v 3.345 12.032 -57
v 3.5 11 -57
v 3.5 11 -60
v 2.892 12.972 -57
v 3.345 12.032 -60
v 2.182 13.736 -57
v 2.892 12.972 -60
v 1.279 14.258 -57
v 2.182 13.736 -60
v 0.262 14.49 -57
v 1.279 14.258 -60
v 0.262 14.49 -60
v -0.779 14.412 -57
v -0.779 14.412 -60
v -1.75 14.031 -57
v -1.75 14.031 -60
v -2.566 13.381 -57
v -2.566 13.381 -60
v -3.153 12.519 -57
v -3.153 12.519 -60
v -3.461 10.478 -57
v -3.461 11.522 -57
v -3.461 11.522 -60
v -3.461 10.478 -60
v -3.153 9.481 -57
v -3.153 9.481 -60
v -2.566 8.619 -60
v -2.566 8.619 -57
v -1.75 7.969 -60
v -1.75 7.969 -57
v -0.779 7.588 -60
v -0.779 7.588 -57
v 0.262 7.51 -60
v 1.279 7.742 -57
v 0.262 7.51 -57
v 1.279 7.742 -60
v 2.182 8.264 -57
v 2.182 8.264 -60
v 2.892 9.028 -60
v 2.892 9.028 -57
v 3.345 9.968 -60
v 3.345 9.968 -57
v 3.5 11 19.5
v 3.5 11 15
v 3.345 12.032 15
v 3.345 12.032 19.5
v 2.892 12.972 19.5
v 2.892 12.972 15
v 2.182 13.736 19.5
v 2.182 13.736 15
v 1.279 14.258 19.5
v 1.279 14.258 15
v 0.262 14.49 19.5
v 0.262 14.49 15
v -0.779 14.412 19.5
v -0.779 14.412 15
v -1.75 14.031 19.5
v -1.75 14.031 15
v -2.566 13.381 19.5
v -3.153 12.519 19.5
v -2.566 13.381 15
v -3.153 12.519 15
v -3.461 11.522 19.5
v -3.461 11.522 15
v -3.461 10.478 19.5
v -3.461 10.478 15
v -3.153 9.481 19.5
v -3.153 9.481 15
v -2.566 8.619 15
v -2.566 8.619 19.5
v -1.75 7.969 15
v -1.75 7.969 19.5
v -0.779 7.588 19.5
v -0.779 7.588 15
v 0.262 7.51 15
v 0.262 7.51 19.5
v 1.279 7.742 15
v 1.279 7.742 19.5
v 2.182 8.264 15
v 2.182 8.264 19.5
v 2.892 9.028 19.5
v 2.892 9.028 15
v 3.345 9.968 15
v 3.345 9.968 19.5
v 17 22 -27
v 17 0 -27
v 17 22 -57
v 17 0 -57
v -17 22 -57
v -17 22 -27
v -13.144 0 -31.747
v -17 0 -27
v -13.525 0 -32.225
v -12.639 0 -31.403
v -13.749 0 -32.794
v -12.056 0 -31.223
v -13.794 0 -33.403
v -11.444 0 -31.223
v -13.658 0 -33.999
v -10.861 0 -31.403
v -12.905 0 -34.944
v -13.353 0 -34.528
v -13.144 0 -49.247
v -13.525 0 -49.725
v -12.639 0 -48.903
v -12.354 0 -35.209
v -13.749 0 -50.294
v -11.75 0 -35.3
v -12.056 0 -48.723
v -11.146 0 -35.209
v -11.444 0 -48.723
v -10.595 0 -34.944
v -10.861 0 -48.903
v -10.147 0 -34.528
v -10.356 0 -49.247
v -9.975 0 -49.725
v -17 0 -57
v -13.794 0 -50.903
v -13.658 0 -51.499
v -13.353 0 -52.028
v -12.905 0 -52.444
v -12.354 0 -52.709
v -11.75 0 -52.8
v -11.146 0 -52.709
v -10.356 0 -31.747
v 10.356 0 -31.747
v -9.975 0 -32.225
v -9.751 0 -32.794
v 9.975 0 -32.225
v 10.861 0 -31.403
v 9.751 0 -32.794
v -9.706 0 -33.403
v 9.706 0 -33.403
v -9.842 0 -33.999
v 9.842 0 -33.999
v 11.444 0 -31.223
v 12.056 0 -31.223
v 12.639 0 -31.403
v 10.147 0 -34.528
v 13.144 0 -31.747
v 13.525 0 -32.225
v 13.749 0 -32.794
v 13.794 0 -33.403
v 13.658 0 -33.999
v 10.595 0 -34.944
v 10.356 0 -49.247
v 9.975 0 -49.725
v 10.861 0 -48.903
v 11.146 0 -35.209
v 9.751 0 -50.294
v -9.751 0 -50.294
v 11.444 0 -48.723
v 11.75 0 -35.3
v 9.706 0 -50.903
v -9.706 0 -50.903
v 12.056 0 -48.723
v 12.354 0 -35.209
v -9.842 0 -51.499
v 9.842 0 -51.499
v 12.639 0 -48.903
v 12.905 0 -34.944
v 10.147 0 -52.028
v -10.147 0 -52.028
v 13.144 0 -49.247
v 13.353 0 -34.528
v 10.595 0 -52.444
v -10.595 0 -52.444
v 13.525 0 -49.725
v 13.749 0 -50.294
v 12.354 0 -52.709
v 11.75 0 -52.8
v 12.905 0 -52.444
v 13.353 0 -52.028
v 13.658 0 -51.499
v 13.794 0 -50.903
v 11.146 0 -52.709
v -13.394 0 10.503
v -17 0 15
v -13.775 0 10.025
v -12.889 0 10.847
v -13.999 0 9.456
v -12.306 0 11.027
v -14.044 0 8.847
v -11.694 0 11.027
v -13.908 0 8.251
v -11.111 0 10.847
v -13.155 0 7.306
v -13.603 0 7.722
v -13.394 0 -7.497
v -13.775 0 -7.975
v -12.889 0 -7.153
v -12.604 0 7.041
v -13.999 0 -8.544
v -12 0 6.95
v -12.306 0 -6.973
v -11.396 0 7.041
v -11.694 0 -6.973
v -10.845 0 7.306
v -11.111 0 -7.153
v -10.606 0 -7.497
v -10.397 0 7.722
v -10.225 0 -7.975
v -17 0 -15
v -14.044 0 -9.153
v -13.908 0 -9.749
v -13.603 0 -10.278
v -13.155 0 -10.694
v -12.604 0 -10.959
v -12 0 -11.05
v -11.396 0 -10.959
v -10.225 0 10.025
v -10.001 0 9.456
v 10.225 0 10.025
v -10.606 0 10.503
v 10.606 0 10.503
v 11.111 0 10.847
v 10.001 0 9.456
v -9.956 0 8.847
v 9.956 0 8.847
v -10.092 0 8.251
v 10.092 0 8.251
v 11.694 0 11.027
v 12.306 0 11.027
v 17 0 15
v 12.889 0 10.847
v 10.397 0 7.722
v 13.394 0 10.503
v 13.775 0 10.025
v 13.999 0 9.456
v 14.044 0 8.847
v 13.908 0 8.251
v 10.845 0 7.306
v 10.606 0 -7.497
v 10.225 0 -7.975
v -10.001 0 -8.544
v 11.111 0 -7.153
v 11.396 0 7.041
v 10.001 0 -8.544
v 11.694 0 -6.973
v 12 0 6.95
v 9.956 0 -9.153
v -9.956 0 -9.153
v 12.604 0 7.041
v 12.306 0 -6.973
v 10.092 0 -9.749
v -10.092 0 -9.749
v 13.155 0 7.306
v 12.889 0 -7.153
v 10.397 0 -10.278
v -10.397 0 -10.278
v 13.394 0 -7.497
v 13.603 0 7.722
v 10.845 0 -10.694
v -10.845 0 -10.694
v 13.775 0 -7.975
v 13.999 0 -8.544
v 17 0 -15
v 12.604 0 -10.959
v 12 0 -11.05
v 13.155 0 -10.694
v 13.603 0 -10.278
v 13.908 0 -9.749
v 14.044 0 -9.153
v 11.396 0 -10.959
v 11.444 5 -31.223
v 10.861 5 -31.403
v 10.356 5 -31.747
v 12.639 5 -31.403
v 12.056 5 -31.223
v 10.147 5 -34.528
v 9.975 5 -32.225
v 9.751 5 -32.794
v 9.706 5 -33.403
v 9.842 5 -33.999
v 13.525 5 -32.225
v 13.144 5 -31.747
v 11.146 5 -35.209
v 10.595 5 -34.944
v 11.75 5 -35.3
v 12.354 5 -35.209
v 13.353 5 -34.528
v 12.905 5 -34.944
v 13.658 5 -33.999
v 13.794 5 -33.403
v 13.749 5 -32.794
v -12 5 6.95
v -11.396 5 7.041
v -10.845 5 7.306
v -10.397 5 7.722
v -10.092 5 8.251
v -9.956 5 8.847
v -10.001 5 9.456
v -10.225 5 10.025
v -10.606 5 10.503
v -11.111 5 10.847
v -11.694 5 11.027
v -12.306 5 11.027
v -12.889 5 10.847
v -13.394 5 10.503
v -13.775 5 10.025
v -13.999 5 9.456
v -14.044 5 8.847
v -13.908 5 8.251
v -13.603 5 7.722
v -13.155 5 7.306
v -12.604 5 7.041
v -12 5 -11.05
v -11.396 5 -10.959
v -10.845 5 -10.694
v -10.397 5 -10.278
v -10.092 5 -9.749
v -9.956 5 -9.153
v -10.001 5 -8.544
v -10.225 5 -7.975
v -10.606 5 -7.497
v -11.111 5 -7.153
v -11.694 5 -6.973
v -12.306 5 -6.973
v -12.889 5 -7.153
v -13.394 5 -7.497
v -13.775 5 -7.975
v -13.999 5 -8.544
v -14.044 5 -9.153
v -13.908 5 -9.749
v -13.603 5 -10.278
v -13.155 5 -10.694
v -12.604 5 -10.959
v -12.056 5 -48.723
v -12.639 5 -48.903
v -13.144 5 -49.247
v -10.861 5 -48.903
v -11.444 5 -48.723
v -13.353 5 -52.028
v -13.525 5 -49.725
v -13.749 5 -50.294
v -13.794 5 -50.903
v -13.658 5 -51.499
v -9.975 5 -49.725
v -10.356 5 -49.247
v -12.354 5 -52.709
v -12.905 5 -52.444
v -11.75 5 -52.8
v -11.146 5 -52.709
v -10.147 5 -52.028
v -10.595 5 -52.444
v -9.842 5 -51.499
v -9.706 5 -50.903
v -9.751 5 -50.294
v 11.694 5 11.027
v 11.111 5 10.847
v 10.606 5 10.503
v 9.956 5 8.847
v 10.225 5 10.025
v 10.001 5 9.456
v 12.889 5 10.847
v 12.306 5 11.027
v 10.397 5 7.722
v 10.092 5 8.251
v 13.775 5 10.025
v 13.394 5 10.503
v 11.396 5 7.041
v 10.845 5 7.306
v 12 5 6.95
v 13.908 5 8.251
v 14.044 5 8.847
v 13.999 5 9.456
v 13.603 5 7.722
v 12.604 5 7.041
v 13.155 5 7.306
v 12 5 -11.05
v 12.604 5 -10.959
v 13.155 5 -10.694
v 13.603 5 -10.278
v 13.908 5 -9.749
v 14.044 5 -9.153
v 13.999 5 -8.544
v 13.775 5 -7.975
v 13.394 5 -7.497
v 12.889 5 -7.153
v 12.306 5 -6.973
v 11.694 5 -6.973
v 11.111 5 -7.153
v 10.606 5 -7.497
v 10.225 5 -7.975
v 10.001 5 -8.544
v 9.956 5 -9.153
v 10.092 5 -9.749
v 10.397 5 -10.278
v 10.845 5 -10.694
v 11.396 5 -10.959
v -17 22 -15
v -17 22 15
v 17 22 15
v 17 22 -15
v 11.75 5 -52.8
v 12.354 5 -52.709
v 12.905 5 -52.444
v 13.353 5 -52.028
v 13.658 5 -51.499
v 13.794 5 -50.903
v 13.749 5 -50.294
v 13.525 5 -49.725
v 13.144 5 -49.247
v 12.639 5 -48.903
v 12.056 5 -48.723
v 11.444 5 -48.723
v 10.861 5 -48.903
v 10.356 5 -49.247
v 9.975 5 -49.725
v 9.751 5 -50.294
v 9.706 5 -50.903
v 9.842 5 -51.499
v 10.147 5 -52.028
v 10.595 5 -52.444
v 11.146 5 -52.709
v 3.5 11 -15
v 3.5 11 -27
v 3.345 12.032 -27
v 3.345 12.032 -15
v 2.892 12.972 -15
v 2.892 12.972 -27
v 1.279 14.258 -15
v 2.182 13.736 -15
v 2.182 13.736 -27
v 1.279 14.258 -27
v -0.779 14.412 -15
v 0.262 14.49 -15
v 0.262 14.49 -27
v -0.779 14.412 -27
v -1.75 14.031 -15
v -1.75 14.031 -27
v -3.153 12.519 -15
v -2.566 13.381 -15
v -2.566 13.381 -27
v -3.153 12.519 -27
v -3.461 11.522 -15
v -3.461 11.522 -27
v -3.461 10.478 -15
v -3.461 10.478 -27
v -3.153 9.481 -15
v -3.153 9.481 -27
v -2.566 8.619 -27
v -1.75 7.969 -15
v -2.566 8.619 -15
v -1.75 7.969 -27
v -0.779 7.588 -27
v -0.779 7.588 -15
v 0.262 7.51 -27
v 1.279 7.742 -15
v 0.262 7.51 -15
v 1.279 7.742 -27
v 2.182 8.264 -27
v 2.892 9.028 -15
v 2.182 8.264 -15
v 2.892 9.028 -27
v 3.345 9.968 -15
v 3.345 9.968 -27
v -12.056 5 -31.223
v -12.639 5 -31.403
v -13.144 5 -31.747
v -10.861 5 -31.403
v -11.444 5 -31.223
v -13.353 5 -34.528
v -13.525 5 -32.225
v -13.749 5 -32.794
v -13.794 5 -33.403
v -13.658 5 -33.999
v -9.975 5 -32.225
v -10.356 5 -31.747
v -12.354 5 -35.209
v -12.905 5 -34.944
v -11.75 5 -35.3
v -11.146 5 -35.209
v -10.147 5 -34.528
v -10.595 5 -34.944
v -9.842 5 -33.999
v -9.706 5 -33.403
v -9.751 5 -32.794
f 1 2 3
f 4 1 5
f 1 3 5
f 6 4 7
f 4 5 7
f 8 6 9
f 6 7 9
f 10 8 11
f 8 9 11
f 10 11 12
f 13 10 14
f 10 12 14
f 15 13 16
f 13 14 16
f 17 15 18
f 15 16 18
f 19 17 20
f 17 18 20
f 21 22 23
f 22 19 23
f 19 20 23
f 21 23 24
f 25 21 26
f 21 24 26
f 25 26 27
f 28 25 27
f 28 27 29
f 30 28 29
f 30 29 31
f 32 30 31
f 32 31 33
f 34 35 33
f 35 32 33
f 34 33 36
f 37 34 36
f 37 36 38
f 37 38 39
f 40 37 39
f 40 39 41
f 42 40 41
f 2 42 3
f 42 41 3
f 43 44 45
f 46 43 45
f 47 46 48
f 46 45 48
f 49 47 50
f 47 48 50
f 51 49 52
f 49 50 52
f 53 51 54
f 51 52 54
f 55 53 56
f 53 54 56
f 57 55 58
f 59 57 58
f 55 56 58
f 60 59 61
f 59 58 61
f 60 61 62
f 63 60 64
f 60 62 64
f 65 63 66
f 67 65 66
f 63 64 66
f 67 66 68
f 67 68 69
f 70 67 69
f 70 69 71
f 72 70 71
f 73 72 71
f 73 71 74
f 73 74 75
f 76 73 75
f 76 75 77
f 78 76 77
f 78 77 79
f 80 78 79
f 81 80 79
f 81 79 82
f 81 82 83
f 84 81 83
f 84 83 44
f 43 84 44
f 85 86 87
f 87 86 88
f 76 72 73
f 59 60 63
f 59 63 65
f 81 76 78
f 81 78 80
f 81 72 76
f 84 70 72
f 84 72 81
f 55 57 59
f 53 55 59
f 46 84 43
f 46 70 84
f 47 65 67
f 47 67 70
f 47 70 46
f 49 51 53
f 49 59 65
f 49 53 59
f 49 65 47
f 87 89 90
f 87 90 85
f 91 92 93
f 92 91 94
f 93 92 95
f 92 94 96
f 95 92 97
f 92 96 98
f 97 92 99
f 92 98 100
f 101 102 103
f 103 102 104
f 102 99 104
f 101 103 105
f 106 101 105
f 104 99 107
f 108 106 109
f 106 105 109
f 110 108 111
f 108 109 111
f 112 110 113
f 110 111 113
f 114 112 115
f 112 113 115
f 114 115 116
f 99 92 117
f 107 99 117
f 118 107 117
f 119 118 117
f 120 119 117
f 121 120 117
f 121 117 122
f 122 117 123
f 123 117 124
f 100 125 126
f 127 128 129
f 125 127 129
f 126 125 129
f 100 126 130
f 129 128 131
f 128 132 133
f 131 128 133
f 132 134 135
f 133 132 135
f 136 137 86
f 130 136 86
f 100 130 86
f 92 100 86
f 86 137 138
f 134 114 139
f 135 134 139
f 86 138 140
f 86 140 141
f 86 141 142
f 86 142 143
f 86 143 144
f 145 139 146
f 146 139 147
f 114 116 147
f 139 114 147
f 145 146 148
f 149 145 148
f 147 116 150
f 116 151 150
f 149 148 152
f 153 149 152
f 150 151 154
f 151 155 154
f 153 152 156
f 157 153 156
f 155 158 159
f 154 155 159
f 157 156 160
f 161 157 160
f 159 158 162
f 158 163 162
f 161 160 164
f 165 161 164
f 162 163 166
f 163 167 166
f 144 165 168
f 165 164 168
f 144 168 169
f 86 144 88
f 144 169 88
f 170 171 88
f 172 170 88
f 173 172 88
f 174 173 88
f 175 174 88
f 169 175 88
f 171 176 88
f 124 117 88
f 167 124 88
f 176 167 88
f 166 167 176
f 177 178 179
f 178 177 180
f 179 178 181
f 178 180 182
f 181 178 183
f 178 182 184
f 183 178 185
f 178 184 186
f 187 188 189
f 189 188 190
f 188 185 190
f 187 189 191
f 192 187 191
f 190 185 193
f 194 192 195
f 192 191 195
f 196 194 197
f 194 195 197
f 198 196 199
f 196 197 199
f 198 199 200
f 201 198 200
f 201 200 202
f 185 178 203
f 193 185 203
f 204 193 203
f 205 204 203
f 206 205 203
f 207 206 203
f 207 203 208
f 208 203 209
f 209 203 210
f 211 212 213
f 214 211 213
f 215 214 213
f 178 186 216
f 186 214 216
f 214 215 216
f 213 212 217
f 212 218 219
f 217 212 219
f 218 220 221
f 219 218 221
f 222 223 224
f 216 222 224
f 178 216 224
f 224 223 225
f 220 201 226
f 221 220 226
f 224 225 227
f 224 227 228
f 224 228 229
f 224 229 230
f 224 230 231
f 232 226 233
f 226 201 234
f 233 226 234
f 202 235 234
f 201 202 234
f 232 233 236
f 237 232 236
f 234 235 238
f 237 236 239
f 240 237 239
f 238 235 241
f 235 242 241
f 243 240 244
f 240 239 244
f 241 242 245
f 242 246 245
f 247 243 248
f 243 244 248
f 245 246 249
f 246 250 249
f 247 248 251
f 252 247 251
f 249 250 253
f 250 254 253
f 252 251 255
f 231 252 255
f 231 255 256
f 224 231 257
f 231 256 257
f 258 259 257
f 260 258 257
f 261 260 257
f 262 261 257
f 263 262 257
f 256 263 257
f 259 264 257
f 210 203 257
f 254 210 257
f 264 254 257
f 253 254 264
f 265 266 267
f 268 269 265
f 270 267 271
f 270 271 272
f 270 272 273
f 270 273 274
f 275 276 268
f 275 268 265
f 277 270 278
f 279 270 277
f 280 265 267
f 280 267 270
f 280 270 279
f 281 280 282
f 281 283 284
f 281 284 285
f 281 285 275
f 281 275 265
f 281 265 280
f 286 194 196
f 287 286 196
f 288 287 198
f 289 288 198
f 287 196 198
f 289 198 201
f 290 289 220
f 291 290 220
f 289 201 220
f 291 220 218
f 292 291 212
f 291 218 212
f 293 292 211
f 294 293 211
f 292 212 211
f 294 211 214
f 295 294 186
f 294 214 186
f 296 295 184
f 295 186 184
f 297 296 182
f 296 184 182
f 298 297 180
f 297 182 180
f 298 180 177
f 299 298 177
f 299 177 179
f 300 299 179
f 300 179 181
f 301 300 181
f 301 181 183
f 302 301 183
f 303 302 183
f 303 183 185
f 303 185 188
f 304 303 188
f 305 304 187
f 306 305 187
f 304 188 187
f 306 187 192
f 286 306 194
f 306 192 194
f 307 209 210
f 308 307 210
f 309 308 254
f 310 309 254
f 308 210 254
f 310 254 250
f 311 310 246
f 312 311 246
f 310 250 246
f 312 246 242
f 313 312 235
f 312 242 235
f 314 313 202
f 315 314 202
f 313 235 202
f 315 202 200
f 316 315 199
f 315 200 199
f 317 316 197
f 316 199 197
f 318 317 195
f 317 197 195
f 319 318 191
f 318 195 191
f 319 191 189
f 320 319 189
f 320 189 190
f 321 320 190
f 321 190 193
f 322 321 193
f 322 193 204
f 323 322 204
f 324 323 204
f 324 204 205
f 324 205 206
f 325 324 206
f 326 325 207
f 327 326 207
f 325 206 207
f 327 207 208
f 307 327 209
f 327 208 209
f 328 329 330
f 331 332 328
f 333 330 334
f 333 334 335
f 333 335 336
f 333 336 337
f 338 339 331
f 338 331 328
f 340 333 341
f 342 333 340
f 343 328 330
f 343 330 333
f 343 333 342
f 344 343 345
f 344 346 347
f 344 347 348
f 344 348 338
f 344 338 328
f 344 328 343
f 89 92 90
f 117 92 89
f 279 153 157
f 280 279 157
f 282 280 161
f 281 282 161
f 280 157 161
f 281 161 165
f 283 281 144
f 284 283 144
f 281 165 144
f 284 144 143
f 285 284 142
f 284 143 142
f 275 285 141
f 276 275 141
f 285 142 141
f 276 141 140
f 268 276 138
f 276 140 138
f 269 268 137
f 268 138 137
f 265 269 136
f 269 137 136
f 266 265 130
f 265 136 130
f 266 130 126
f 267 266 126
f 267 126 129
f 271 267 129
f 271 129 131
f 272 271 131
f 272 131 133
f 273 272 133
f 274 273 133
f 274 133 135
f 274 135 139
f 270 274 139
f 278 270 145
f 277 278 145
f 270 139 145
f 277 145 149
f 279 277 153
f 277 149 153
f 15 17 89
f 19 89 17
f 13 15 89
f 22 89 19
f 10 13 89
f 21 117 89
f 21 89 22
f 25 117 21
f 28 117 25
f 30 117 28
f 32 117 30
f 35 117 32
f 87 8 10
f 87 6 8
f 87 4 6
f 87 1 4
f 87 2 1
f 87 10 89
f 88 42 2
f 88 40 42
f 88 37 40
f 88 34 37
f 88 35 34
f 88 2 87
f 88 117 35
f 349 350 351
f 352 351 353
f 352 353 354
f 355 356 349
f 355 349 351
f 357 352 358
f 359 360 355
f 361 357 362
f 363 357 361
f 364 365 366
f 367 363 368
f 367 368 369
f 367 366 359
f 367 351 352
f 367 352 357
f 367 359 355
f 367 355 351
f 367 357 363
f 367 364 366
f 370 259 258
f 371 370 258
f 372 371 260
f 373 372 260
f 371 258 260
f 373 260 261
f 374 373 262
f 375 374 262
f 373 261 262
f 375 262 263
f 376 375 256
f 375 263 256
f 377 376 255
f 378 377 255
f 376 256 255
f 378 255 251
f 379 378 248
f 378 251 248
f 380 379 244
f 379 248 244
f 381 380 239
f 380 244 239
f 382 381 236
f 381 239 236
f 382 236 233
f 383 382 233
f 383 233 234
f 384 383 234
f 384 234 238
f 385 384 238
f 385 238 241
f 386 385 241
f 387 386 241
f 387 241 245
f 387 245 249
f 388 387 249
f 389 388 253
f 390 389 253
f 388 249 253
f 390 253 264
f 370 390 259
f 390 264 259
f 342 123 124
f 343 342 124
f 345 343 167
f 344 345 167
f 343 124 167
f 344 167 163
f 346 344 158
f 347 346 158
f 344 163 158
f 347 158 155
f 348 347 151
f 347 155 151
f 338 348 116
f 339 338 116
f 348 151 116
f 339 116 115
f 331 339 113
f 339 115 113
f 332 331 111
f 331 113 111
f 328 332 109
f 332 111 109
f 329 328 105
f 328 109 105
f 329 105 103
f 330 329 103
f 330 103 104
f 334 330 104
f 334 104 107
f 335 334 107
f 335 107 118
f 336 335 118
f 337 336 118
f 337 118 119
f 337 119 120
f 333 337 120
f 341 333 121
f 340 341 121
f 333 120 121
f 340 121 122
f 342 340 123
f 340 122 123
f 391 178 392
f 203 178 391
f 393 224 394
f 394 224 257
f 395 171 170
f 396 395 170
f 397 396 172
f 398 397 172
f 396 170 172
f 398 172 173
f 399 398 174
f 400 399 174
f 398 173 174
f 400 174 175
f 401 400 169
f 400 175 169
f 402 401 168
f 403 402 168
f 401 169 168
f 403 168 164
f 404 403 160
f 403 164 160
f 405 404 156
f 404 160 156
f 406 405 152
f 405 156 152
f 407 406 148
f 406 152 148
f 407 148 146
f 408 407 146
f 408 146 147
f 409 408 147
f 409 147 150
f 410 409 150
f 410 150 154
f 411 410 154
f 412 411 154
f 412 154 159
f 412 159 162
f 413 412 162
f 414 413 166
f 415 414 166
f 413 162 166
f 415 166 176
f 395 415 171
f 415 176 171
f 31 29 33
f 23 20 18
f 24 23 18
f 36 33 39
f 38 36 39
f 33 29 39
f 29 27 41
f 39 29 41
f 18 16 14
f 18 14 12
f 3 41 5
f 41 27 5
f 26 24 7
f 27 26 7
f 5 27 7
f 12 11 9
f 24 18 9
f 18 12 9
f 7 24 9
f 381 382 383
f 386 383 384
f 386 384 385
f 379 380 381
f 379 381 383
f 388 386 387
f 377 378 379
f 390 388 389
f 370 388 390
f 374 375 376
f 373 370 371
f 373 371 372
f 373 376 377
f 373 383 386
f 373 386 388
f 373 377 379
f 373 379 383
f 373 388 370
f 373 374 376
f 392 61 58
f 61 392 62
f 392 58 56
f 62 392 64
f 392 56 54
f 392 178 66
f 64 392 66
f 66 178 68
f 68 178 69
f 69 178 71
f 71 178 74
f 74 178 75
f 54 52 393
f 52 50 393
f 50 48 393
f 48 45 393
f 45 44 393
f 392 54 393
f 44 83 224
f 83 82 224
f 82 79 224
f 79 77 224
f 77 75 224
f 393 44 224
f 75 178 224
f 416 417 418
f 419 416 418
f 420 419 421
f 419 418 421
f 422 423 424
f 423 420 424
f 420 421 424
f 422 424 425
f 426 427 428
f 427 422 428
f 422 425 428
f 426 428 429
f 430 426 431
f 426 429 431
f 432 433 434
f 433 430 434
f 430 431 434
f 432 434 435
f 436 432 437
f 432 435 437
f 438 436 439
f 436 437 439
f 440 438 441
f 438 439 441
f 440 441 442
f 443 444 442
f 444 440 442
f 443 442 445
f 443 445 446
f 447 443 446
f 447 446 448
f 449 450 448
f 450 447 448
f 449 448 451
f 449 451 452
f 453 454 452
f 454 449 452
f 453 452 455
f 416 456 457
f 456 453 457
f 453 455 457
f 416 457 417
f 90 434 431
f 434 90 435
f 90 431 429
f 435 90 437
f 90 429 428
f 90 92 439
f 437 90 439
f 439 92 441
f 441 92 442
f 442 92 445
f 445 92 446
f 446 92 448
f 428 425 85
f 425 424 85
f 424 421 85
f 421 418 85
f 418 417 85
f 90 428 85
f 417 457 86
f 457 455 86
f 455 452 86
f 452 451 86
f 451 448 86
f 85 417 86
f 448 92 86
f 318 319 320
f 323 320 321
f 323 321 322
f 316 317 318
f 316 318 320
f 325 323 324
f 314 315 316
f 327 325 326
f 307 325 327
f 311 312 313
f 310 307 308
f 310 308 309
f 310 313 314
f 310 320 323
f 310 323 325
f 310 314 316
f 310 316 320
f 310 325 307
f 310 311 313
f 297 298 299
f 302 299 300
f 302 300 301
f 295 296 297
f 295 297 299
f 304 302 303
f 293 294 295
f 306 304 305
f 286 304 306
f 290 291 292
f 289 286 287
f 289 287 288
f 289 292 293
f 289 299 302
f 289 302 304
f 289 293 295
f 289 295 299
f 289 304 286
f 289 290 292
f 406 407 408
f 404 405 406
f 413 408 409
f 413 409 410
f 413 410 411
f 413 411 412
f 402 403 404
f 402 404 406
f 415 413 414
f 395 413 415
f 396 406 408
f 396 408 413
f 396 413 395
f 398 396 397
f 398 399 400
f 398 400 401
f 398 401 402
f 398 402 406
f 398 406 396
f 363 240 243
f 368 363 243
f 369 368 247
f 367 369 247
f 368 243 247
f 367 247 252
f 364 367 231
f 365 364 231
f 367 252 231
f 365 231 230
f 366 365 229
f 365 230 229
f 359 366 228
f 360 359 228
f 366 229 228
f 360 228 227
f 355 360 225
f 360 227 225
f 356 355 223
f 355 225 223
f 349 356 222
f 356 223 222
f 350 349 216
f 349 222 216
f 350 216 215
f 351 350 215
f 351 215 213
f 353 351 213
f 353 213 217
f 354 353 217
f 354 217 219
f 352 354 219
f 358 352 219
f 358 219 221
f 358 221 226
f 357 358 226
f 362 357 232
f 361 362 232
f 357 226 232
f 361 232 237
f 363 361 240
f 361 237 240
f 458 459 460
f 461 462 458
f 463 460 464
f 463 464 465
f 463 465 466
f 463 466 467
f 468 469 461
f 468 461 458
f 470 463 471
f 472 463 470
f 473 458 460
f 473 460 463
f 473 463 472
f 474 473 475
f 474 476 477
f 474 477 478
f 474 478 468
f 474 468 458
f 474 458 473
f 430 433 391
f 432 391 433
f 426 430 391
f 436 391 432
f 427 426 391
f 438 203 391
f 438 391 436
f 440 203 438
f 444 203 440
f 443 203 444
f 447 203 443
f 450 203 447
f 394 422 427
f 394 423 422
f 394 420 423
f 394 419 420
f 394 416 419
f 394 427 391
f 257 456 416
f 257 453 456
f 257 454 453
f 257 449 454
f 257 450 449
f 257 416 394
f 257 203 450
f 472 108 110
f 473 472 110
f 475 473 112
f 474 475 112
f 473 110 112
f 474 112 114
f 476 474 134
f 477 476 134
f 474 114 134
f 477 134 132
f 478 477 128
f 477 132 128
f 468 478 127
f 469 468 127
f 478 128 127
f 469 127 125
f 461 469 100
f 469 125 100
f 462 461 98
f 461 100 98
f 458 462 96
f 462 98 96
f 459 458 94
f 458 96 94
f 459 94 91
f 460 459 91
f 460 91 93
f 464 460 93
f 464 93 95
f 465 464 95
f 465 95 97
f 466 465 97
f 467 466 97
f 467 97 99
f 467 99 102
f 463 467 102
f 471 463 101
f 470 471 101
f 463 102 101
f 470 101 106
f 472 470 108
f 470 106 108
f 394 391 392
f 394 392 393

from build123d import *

# Parameters (mm, degrees)
SKETCH_1_W           = 34
SKETCH_1_H           = 30
EXTRUDE_1_DEPTH      = 22
EXTRUDE_1_2_DEPTH    = 22
EXTRUDE_2_DEPTH      = 4.5
EXTRUDE_2_DEPTH_BACK = 75
SKETCH_2_R           = 3.5
SKETCH_3_R           = 2.05
CUT_EXTRUDE_1_DEPTH  = 5


with BuildPart() as part:
    # 草图1 → 凸台-拉伸1 (new body)
    with BuildSketch(Plane(origin=(0, 0, 0), x_dir=(1, 0, 0), z_dir=(0, 1, 0))):
        Rectangle(SKETCH_1_W, SKETCH_1_H)
    extrude(amount=EXTRUDE_1_DEPTH)



with BuildPart() as body_2:
    # 草图1 → Extrude 1 2 (new body)
    with BuildSketch(Plane(origin=(0, 0, 0), x_dir=(1, 0, 0), z_dir=(0, 1, 0))):
        with Locations((0, 42)):
            Rectangle(SKETCH_1_W, SKETCH_1_H)
    extrude(amount=EXTRUDE_1_2_DEPTH)


with BuildPart() as part_1:
    add(part.part)

    add(body_2.part)  # 凸台-拉伸2 merges body 2
    # 草图2 → 凸台-拉伸2 (add, two sides: drawn at the far end of the back side and taken through both)
    with BuildSketch(Plane.XY.offset(15).offset(-EXTRUDE_2_DEPTH_BACK)):
        with Locations((0, 11)):
            Circle(SKETCH_2_R)
    extrude(amount=EXTRUDE_2_DEPTH + EXTRUDE_2_DEPTH_BACK)

    # 草图3 → 切除-拉伸1 (cut)
    with BuildSketch(Plane(origin=(0, 0, 0), x_dir=(-1, 0, 0), z_dir=(0, -1, 0))):
        with Locations(Location((-11.75, 33.25, 0), (0, 0, 90))):
            Circle(SKETCH_3_R)
        with Locations(Location((11.75, 33.25, 0), (0, 0, 90))):
            Circle(SKETCH_3_R)
        with Locations(Location((11.75, 50.75, 0), (0, 0, 90))):
            Circle(SKETCH_3_R)
        with Locations(Location((-11.75, 50.75, 0), (0, 0, 90))):
            Circle(SKETCH_3_R)
        with Locations(Location((-12, -9, 0), (0, 0, 90))):
            Circle(SKETCH_3_R)
        with Locations(Location((-12, 9, 0), (0, 0, 90))):
            Circle(SKETCH_3_R)
        with Locations(Location((12, 9, 0), (0, 0, 90))):
            Circle(SKETCH_3_R)
        with Locations(Location((12, -9, 0), (0, 0, 90))):
            Circle(SKETCH_3_R)
    extrude(amount=-CUT_EXTRUDE_1_DEPTH, mode=Mode.SUBTRACT)


solid = part_1.part
